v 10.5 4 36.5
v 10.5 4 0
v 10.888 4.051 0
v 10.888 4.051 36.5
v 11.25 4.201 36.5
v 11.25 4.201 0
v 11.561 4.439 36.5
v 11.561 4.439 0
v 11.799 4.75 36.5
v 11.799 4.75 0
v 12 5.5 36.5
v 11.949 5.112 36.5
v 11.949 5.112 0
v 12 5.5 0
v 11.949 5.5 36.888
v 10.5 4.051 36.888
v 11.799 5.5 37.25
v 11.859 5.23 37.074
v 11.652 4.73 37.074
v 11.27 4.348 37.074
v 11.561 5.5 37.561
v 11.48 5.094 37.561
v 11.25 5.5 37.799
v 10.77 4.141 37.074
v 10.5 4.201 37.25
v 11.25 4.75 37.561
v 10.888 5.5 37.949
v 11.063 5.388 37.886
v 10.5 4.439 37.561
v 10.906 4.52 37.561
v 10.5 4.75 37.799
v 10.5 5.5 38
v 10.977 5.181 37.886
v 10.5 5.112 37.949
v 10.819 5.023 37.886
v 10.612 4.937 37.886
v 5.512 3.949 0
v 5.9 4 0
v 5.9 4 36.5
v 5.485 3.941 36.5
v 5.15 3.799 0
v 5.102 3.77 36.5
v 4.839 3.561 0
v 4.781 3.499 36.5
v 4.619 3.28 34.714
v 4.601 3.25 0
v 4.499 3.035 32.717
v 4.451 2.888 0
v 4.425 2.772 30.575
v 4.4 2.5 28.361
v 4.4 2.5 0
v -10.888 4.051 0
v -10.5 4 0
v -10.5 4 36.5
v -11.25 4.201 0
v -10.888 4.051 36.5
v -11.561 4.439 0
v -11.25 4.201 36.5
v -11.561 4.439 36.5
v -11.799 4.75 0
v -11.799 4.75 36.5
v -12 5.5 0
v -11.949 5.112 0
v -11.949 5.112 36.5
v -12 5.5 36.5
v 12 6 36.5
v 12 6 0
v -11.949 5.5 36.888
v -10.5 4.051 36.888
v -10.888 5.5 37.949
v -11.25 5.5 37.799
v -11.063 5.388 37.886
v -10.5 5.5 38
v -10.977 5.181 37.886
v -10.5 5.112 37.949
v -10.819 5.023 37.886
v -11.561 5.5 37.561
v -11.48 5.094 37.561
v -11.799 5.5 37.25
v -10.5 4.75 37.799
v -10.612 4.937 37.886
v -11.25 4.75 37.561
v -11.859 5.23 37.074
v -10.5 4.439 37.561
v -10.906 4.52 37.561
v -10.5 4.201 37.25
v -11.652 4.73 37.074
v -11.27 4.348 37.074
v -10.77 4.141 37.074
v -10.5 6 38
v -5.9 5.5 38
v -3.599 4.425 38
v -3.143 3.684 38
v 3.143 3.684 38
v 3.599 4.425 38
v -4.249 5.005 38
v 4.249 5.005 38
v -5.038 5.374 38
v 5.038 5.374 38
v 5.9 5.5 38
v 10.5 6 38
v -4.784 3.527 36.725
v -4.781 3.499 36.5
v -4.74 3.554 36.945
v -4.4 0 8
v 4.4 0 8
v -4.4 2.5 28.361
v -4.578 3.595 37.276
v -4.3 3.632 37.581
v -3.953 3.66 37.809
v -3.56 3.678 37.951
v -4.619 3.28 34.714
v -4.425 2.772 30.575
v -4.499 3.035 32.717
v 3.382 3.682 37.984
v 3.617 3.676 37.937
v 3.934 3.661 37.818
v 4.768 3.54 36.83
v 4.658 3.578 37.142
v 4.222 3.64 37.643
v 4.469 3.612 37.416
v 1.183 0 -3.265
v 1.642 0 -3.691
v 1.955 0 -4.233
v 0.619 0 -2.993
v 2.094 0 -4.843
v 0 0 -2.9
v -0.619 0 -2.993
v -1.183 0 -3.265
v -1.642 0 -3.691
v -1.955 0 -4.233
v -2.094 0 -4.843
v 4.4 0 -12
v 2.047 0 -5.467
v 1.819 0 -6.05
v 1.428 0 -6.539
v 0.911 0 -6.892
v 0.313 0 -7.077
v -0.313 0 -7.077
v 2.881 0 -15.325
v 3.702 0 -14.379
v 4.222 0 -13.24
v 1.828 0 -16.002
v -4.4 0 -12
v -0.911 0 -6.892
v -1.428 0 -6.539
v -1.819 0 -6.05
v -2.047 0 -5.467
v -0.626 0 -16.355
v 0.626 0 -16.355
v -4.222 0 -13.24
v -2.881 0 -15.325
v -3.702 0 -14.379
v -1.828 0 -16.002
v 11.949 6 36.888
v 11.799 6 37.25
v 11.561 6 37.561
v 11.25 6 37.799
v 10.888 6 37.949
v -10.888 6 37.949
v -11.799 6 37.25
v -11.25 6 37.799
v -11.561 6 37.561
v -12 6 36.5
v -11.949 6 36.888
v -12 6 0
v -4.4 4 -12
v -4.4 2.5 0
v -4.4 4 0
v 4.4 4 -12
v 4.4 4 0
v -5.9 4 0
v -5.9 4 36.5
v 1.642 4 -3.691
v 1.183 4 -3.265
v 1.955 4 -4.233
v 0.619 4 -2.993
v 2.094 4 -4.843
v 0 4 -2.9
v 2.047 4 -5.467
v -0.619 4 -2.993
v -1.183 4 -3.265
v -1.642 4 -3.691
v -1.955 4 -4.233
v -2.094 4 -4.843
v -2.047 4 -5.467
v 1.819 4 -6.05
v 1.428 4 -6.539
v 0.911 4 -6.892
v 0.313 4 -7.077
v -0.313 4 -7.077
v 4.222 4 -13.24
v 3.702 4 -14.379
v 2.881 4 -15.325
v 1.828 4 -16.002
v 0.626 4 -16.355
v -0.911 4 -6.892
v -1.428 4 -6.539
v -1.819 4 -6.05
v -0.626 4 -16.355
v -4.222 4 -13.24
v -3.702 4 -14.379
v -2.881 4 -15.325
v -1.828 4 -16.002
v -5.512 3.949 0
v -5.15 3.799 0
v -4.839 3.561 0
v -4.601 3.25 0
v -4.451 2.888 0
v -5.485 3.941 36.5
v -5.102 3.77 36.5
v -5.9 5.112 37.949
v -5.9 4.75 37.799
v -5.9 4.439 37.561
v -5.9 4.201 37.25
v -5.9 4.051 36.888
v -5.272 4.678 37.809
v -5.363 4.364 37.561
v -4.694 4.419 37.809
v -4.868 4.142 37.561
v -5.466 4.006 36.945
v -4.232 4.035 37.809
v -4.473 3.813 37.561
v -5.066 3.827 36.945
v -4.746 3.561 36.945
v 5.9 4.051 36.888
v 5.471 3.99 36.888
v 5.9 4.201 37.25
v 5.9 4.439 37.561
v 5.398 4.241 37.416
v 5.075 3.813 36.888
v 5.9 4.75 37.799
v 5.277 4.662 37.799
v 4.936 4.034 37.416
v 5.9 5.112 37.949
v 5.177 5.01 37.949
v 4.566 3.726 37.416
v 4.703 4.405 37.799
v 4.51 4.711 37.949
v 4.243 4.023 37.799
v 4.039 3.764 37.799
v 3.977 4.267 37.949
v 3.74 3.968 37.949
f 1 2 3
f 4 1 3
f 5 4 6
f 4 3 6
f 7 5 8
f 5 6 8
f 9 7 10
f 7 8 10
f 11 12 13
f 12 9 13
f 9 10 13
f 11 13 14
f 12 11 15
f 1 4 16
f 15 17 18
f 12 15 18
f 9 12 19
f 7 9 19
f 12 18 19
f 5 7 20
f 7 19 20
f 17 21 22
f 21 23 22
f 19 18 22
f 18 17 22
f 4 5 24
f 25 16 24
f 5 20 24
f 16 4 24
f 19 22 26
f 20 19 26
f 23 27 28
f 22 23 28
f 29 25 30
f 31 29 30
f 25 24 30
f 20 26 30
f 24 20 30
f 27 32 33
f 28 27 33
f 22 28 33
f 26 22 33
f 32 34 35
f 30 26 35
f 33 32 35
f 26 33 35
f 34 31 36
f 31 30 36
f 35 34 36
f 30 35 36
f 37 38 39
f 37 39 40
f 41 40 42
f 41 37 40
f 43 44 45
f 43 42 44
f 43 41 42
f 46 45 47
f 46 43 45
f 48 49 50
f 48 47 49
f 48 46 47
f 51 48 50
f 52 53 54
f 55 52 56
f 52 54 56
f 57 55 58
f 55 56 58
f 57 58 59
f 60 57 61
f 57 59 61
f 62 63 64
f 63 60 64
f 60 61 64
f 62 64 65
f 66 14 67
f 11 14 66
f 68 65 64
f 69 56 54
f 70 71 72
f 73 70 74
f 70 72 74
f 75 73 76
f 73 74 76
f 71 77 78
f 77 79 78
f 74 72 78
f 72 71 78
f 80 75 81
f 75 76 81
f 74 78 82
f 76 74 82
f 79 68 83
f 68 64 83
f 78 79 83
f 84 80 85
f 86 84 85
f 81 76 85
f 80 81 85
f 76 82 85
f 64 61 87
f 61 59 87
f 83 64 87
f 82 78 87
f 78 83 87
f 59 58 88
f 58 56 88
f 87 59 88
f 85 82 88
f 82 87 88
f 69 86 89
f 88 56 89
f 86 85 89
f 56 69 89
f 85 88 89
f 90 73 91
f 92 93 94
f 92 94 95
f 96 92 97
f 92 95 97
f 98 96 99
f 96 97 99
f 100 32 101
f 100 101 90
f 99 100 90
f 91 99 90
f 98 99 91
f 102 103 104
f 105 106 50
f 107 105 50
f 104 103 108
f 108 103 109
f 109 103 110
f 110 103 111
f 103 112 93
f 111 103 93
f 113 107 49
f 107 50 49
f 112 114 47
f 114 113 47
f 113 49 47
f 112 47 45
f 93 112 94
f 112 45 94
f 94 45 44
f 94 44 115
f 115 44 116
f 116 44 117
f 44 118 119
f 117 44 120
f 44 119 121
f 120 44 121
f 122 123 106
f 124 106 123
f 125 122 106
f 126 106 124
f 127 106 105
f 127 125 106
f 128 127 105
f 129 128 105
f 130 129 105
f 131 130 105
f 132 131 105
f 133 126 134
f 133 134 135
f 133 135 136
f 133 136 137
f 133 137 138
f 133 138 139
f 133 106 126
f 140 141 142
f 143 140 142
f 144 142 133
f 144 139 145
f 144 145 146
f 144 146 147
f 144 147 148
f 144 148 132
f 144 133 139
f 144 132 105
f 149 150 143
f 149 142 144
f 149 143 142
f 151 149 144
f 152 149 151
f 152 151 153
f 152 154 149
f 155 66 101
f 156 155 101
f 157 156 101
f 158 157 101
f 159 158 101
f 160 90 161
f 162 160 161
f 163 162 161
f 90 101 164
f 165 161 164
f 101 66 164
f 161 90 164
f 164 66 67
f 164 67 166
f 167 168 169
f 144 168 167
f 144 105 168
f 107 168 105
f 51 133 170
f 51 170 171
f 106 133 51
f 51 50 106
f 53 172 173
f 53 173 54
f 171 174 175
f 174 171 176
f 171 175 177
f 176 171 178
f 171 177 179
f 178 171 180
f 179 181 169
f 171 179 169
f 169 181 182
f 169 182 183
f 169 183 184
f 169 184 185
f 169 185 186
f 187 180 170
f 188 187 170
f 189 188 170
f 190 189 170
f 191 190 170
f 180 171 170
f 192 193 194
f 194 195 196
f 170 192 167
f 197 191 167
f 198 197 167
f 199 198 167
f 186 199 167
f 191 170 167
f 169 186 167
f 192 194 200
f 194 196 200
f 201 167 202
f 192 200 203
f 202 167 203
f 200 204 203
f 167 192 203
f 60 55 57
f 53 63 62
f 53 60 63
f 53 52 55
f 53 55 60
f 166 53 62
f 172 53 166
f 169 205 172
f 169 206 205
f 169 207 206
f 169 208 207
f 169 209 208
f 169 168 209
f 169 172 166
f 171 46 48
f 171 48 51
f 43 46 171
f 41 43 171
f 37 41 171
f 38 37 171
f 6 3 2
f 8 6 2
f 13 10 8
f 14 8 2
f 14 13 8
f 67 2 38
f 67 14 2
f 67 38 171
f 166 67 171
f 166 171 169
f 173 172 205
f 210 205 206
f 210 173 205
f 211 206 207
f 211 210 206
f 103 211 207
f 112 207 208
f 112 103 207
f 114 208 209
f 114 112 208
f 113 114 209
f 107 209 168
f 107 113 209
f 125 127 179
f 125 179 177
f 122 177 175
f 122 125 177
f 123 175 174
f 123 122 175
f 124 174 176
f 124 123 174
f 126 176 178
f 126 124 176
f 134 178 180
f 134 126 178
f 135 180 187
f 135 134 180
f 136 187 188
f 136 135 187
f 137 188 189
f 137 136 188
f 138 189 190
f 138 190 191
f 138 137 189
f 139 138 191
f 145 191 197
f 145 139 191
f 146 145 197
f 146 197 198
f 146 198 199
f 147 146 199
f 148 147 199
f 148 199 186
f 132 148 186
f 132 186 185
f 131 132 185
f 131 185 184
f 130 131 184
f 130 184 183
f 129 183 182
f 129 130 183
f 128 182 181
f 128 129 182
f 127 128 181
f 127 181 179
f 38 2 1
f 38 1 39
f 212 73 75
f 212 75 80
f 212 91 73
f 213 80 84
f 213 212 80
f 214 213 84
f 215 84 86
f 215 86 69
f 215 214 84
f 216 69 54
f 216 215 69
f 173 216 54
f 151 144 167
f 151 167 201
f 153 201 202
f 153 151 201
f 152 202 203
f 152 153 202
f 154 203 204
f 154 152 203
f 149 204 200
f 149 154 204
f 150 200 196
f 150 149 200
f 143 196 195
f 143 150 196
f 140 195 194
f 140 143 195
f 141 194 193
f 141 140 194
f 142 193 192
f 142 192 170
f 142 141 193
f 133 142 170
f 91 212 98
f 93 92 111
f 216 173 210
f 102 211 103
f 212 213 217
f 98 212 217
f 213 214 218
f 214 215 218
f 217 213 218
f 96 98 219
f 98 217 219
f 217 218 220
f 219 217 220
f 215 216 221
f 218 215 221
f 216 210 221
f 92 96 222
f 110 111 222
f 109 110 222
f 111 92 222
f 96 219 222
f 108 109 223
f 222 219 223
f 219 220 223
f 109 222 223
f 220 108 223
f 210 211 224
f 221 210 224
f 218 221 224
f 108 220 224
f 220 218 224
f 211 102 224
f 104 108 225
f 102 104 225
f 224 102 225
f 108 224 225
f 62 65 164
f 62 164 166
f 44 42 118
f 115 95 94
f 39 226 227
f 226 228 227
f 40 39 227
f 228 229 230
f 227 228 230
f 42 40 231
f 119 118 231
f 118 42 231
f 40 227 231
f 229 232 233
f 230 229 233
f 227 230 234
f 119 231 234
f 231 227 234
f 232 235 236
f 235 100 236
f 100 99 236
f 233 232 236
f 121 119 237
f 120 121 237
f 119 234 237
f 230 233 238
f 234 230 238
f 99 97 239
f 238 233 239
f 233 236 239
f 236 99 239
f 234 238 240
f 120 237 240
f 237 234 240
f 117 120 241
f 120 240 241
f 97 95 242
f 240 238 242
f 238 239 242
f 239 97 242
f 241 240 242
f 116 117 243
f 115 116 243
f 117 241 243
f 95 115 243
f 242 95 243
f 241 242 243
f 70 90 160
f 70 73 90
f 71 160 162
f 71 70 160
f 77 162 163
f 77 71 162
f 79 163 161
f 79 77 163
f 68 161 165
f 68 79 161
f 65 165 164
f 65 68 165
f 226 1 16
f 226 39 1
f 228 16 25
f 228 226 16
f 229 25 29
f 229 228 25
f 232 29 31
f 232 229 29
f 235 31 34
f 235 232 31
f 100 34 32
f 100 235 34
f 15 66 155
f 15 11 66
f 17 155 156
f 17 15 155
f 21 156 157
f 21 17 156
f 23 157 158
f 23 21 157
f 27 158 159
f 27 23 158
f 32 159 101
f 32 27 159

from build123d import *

# Parameters (mm, degrees)
SKETCH2_R           = 2.1
BOSS_EXTRUDE1_DEPTH = 4
BOSS_EXTRUDE2_DEPTH = 2
CHAMFER1_SIZE       = 30
CHAMFER1_SIZE2      = 3.683536827087146
FILLET2_R           = 1.5
FILLET4_R           = 1.5


with BuildPart() as part:
    # Sketch2 → Boss-Extrude1 (new body)
    with BuildSketch(Plane(origin=(0, 0, 0), x_dir=(1, 0, 0), z_dir=(0, 1, 0))):
        with BuildLine():
            Line((-4.4, -1.507e-14), (-4.4, 12))
            ThreePointArc((-4.4, 12), (2.7e-16, 16.4), (4.4, 12))
            Line((4.4, 12), (4.4, 1.507e-14))
            Line((4.4, 1.507e-14), (4.4, -38.000000000000014))
            Line((4.4, -38.000000000000014), (-4.399999999999994, -38.000000000000014))
            Line((-4.399999999999994, -38.000000000000014), (-4.4, -1.507e-14))
        make_face()
        with Locations(Location((0, 5, 0), (0, 0, 270))):
            Circle(SKETCH2_R, mode=Mode.SUBTRACT)
    extrude(amount=BOSS_EXTRUDE1_DEPTH)

    # Sketch3 → Boss-Extrude2 (add)
    with BuildSketch(Plane(origin=(0, 4, 0), x_dir=(1, 0, 0), z_dir=(0, 1, 0))):
        Polygon((-12, 0), (12, 0), (12.000000000000002, -38), (-11.999999999999995, -38), align=None)
    extrude(amount=BOSS_EXTRUDE2_DEPTH)

    # Chamfer1
    chamfer1_edges = [part.edges().sort_by_distance(p)[0] for p in [
        (3.55e-15, 0, 38.000000000000014),
    ]]
    chamfer1_side = [part.faces().sort_by_distance(p)[0] for p in [
        (1.53e-15, 0, 11.756614981879217),
    ]]
    chamfer(chamfer1_edges, length=CHAMFER1_SIZE, length2=CHAMFER1_SIZE2, reference=chamfer1_side[0])

    # Fillet2
    # the kernel refuses this fillet: 1.5 mm, written as the material it adds along each edge
    with BuildSketch(Plane(origin=(-4.399999999999994, 4, 38.000000000000014), x_dir=(-4.14e-15, -1, 0), z_dir=(-1.2e-16, 0, -1))) as fillet2_piece_1_section:
        with BuildLine():
            CenterArc((FILLET2_R, FILLET2_R), FILLET2_R, 180, 89.99999999999977)
            Line((6.22e-15, FILLET2_R), (0, 0))
            Line((0, 0), (FILLET2_R, 0))
        make_face()
    fillet2_piece_1 = extrude(amount=38.000000000000014, mode=Mode.PRIVATE)
    fillet2_piece_1 = split(fillet2_piece_1, bisect_by=Plane(origin=(-4.741166225178414, 1.3298279167086908, 18.830579243267316), z_dir=(0, 0.992546151641322, -0.12186934340514775)), keep=Keep.TOP, mode=Mode.PRIVATE)
    add(fillet2_piece_1)
    with BuildSketch(Plane(origin=(4.4, 4, 0), x_dir=(0, -1, 0), z_dir=(0, 0, 1))) as fillet2_piece_2_section:
        with BuildLine():
            CenterArc((FILLET2_R, FILLET2_R), FILLET2_R, 180, 90)
            Line((0, FILLET2_R), (0, 0))
            Line((0, 0), (FILLET2_R, 0))
        make_face()
    fillet2_piece_2 = extrude(amount=38.000000000000014, mode=Mode.PRIVATE)
    fillet2_piece_2 = split(fillet2_piece_2, bisect_by=Plane(origin=(4.741166225178429, 1.3298279167086202, 18.830579243266737), z_dir=(0, 0.992546151641322, -0.12186934340514775)), keep=Keep.TOP, mode=Mode.PRIVATE)
    add(fillet2_piece_2)
    # the kernel refuses this fillet: 1.5 mm, written as the material it takes off along each edge
    with BuildSketch(Plane(origin=(-11.999999999999995, 4, 41.75), x_dir=(0, 1, 0), z_dir=(-1.4e-16, 0, -1))) as fillet2_2_piece_1:
        with BuildLine():
            CenterArc((FILLET2_R, FILLET2_R), FILLET2_R, 180, 90)
            Line((0, FILLET2_R), (0, 0))
            Line((0, 0), (FILLET2_R, 0))
        make_face()
    extrude(amount=45.5, mode=Mode.SUBTRACT)
    with BuildSketch(Plane(origin=(12, 4, -3.75), x_dir=(-1, 0, 5e-17), z_dir=(5e-17, 0, 1))) as fillet2_2_piece_2:
        with BuildLine():
            CenterArc((FILLET2_R, -FILLET2_R), FILLET2_R, 90, 90)
            Line((0, -FILLET2_R), (0, 0))
            Line((0, 0), (FILLET2_R, 0))
        make_face()
    extrude(amount=45.5, mode=Mode.SUBTRACT)

    # Fillet4
    fillet4_edges = [part.edges().sort_by_distance(p)[0] for p in [
        (5.41281689306181, 3.918679886483928, 38),
        (8.2, 4, 38),
        (11.560660171779821, 4.439339828220179, 38),
        (-5.41281689306181, 3.918679886483928, 38),
        (-8.200000000000001, 4, 38),
        (-11.560660171779821, 4.439339828220179, 38),
        (12.000000000000002, 5.75, 38),
        (-11.999999999999995, 5.75, 38),
    ]]
    fillet(fillet4_edges, radius=FILLET4_R)


solid = part.part
